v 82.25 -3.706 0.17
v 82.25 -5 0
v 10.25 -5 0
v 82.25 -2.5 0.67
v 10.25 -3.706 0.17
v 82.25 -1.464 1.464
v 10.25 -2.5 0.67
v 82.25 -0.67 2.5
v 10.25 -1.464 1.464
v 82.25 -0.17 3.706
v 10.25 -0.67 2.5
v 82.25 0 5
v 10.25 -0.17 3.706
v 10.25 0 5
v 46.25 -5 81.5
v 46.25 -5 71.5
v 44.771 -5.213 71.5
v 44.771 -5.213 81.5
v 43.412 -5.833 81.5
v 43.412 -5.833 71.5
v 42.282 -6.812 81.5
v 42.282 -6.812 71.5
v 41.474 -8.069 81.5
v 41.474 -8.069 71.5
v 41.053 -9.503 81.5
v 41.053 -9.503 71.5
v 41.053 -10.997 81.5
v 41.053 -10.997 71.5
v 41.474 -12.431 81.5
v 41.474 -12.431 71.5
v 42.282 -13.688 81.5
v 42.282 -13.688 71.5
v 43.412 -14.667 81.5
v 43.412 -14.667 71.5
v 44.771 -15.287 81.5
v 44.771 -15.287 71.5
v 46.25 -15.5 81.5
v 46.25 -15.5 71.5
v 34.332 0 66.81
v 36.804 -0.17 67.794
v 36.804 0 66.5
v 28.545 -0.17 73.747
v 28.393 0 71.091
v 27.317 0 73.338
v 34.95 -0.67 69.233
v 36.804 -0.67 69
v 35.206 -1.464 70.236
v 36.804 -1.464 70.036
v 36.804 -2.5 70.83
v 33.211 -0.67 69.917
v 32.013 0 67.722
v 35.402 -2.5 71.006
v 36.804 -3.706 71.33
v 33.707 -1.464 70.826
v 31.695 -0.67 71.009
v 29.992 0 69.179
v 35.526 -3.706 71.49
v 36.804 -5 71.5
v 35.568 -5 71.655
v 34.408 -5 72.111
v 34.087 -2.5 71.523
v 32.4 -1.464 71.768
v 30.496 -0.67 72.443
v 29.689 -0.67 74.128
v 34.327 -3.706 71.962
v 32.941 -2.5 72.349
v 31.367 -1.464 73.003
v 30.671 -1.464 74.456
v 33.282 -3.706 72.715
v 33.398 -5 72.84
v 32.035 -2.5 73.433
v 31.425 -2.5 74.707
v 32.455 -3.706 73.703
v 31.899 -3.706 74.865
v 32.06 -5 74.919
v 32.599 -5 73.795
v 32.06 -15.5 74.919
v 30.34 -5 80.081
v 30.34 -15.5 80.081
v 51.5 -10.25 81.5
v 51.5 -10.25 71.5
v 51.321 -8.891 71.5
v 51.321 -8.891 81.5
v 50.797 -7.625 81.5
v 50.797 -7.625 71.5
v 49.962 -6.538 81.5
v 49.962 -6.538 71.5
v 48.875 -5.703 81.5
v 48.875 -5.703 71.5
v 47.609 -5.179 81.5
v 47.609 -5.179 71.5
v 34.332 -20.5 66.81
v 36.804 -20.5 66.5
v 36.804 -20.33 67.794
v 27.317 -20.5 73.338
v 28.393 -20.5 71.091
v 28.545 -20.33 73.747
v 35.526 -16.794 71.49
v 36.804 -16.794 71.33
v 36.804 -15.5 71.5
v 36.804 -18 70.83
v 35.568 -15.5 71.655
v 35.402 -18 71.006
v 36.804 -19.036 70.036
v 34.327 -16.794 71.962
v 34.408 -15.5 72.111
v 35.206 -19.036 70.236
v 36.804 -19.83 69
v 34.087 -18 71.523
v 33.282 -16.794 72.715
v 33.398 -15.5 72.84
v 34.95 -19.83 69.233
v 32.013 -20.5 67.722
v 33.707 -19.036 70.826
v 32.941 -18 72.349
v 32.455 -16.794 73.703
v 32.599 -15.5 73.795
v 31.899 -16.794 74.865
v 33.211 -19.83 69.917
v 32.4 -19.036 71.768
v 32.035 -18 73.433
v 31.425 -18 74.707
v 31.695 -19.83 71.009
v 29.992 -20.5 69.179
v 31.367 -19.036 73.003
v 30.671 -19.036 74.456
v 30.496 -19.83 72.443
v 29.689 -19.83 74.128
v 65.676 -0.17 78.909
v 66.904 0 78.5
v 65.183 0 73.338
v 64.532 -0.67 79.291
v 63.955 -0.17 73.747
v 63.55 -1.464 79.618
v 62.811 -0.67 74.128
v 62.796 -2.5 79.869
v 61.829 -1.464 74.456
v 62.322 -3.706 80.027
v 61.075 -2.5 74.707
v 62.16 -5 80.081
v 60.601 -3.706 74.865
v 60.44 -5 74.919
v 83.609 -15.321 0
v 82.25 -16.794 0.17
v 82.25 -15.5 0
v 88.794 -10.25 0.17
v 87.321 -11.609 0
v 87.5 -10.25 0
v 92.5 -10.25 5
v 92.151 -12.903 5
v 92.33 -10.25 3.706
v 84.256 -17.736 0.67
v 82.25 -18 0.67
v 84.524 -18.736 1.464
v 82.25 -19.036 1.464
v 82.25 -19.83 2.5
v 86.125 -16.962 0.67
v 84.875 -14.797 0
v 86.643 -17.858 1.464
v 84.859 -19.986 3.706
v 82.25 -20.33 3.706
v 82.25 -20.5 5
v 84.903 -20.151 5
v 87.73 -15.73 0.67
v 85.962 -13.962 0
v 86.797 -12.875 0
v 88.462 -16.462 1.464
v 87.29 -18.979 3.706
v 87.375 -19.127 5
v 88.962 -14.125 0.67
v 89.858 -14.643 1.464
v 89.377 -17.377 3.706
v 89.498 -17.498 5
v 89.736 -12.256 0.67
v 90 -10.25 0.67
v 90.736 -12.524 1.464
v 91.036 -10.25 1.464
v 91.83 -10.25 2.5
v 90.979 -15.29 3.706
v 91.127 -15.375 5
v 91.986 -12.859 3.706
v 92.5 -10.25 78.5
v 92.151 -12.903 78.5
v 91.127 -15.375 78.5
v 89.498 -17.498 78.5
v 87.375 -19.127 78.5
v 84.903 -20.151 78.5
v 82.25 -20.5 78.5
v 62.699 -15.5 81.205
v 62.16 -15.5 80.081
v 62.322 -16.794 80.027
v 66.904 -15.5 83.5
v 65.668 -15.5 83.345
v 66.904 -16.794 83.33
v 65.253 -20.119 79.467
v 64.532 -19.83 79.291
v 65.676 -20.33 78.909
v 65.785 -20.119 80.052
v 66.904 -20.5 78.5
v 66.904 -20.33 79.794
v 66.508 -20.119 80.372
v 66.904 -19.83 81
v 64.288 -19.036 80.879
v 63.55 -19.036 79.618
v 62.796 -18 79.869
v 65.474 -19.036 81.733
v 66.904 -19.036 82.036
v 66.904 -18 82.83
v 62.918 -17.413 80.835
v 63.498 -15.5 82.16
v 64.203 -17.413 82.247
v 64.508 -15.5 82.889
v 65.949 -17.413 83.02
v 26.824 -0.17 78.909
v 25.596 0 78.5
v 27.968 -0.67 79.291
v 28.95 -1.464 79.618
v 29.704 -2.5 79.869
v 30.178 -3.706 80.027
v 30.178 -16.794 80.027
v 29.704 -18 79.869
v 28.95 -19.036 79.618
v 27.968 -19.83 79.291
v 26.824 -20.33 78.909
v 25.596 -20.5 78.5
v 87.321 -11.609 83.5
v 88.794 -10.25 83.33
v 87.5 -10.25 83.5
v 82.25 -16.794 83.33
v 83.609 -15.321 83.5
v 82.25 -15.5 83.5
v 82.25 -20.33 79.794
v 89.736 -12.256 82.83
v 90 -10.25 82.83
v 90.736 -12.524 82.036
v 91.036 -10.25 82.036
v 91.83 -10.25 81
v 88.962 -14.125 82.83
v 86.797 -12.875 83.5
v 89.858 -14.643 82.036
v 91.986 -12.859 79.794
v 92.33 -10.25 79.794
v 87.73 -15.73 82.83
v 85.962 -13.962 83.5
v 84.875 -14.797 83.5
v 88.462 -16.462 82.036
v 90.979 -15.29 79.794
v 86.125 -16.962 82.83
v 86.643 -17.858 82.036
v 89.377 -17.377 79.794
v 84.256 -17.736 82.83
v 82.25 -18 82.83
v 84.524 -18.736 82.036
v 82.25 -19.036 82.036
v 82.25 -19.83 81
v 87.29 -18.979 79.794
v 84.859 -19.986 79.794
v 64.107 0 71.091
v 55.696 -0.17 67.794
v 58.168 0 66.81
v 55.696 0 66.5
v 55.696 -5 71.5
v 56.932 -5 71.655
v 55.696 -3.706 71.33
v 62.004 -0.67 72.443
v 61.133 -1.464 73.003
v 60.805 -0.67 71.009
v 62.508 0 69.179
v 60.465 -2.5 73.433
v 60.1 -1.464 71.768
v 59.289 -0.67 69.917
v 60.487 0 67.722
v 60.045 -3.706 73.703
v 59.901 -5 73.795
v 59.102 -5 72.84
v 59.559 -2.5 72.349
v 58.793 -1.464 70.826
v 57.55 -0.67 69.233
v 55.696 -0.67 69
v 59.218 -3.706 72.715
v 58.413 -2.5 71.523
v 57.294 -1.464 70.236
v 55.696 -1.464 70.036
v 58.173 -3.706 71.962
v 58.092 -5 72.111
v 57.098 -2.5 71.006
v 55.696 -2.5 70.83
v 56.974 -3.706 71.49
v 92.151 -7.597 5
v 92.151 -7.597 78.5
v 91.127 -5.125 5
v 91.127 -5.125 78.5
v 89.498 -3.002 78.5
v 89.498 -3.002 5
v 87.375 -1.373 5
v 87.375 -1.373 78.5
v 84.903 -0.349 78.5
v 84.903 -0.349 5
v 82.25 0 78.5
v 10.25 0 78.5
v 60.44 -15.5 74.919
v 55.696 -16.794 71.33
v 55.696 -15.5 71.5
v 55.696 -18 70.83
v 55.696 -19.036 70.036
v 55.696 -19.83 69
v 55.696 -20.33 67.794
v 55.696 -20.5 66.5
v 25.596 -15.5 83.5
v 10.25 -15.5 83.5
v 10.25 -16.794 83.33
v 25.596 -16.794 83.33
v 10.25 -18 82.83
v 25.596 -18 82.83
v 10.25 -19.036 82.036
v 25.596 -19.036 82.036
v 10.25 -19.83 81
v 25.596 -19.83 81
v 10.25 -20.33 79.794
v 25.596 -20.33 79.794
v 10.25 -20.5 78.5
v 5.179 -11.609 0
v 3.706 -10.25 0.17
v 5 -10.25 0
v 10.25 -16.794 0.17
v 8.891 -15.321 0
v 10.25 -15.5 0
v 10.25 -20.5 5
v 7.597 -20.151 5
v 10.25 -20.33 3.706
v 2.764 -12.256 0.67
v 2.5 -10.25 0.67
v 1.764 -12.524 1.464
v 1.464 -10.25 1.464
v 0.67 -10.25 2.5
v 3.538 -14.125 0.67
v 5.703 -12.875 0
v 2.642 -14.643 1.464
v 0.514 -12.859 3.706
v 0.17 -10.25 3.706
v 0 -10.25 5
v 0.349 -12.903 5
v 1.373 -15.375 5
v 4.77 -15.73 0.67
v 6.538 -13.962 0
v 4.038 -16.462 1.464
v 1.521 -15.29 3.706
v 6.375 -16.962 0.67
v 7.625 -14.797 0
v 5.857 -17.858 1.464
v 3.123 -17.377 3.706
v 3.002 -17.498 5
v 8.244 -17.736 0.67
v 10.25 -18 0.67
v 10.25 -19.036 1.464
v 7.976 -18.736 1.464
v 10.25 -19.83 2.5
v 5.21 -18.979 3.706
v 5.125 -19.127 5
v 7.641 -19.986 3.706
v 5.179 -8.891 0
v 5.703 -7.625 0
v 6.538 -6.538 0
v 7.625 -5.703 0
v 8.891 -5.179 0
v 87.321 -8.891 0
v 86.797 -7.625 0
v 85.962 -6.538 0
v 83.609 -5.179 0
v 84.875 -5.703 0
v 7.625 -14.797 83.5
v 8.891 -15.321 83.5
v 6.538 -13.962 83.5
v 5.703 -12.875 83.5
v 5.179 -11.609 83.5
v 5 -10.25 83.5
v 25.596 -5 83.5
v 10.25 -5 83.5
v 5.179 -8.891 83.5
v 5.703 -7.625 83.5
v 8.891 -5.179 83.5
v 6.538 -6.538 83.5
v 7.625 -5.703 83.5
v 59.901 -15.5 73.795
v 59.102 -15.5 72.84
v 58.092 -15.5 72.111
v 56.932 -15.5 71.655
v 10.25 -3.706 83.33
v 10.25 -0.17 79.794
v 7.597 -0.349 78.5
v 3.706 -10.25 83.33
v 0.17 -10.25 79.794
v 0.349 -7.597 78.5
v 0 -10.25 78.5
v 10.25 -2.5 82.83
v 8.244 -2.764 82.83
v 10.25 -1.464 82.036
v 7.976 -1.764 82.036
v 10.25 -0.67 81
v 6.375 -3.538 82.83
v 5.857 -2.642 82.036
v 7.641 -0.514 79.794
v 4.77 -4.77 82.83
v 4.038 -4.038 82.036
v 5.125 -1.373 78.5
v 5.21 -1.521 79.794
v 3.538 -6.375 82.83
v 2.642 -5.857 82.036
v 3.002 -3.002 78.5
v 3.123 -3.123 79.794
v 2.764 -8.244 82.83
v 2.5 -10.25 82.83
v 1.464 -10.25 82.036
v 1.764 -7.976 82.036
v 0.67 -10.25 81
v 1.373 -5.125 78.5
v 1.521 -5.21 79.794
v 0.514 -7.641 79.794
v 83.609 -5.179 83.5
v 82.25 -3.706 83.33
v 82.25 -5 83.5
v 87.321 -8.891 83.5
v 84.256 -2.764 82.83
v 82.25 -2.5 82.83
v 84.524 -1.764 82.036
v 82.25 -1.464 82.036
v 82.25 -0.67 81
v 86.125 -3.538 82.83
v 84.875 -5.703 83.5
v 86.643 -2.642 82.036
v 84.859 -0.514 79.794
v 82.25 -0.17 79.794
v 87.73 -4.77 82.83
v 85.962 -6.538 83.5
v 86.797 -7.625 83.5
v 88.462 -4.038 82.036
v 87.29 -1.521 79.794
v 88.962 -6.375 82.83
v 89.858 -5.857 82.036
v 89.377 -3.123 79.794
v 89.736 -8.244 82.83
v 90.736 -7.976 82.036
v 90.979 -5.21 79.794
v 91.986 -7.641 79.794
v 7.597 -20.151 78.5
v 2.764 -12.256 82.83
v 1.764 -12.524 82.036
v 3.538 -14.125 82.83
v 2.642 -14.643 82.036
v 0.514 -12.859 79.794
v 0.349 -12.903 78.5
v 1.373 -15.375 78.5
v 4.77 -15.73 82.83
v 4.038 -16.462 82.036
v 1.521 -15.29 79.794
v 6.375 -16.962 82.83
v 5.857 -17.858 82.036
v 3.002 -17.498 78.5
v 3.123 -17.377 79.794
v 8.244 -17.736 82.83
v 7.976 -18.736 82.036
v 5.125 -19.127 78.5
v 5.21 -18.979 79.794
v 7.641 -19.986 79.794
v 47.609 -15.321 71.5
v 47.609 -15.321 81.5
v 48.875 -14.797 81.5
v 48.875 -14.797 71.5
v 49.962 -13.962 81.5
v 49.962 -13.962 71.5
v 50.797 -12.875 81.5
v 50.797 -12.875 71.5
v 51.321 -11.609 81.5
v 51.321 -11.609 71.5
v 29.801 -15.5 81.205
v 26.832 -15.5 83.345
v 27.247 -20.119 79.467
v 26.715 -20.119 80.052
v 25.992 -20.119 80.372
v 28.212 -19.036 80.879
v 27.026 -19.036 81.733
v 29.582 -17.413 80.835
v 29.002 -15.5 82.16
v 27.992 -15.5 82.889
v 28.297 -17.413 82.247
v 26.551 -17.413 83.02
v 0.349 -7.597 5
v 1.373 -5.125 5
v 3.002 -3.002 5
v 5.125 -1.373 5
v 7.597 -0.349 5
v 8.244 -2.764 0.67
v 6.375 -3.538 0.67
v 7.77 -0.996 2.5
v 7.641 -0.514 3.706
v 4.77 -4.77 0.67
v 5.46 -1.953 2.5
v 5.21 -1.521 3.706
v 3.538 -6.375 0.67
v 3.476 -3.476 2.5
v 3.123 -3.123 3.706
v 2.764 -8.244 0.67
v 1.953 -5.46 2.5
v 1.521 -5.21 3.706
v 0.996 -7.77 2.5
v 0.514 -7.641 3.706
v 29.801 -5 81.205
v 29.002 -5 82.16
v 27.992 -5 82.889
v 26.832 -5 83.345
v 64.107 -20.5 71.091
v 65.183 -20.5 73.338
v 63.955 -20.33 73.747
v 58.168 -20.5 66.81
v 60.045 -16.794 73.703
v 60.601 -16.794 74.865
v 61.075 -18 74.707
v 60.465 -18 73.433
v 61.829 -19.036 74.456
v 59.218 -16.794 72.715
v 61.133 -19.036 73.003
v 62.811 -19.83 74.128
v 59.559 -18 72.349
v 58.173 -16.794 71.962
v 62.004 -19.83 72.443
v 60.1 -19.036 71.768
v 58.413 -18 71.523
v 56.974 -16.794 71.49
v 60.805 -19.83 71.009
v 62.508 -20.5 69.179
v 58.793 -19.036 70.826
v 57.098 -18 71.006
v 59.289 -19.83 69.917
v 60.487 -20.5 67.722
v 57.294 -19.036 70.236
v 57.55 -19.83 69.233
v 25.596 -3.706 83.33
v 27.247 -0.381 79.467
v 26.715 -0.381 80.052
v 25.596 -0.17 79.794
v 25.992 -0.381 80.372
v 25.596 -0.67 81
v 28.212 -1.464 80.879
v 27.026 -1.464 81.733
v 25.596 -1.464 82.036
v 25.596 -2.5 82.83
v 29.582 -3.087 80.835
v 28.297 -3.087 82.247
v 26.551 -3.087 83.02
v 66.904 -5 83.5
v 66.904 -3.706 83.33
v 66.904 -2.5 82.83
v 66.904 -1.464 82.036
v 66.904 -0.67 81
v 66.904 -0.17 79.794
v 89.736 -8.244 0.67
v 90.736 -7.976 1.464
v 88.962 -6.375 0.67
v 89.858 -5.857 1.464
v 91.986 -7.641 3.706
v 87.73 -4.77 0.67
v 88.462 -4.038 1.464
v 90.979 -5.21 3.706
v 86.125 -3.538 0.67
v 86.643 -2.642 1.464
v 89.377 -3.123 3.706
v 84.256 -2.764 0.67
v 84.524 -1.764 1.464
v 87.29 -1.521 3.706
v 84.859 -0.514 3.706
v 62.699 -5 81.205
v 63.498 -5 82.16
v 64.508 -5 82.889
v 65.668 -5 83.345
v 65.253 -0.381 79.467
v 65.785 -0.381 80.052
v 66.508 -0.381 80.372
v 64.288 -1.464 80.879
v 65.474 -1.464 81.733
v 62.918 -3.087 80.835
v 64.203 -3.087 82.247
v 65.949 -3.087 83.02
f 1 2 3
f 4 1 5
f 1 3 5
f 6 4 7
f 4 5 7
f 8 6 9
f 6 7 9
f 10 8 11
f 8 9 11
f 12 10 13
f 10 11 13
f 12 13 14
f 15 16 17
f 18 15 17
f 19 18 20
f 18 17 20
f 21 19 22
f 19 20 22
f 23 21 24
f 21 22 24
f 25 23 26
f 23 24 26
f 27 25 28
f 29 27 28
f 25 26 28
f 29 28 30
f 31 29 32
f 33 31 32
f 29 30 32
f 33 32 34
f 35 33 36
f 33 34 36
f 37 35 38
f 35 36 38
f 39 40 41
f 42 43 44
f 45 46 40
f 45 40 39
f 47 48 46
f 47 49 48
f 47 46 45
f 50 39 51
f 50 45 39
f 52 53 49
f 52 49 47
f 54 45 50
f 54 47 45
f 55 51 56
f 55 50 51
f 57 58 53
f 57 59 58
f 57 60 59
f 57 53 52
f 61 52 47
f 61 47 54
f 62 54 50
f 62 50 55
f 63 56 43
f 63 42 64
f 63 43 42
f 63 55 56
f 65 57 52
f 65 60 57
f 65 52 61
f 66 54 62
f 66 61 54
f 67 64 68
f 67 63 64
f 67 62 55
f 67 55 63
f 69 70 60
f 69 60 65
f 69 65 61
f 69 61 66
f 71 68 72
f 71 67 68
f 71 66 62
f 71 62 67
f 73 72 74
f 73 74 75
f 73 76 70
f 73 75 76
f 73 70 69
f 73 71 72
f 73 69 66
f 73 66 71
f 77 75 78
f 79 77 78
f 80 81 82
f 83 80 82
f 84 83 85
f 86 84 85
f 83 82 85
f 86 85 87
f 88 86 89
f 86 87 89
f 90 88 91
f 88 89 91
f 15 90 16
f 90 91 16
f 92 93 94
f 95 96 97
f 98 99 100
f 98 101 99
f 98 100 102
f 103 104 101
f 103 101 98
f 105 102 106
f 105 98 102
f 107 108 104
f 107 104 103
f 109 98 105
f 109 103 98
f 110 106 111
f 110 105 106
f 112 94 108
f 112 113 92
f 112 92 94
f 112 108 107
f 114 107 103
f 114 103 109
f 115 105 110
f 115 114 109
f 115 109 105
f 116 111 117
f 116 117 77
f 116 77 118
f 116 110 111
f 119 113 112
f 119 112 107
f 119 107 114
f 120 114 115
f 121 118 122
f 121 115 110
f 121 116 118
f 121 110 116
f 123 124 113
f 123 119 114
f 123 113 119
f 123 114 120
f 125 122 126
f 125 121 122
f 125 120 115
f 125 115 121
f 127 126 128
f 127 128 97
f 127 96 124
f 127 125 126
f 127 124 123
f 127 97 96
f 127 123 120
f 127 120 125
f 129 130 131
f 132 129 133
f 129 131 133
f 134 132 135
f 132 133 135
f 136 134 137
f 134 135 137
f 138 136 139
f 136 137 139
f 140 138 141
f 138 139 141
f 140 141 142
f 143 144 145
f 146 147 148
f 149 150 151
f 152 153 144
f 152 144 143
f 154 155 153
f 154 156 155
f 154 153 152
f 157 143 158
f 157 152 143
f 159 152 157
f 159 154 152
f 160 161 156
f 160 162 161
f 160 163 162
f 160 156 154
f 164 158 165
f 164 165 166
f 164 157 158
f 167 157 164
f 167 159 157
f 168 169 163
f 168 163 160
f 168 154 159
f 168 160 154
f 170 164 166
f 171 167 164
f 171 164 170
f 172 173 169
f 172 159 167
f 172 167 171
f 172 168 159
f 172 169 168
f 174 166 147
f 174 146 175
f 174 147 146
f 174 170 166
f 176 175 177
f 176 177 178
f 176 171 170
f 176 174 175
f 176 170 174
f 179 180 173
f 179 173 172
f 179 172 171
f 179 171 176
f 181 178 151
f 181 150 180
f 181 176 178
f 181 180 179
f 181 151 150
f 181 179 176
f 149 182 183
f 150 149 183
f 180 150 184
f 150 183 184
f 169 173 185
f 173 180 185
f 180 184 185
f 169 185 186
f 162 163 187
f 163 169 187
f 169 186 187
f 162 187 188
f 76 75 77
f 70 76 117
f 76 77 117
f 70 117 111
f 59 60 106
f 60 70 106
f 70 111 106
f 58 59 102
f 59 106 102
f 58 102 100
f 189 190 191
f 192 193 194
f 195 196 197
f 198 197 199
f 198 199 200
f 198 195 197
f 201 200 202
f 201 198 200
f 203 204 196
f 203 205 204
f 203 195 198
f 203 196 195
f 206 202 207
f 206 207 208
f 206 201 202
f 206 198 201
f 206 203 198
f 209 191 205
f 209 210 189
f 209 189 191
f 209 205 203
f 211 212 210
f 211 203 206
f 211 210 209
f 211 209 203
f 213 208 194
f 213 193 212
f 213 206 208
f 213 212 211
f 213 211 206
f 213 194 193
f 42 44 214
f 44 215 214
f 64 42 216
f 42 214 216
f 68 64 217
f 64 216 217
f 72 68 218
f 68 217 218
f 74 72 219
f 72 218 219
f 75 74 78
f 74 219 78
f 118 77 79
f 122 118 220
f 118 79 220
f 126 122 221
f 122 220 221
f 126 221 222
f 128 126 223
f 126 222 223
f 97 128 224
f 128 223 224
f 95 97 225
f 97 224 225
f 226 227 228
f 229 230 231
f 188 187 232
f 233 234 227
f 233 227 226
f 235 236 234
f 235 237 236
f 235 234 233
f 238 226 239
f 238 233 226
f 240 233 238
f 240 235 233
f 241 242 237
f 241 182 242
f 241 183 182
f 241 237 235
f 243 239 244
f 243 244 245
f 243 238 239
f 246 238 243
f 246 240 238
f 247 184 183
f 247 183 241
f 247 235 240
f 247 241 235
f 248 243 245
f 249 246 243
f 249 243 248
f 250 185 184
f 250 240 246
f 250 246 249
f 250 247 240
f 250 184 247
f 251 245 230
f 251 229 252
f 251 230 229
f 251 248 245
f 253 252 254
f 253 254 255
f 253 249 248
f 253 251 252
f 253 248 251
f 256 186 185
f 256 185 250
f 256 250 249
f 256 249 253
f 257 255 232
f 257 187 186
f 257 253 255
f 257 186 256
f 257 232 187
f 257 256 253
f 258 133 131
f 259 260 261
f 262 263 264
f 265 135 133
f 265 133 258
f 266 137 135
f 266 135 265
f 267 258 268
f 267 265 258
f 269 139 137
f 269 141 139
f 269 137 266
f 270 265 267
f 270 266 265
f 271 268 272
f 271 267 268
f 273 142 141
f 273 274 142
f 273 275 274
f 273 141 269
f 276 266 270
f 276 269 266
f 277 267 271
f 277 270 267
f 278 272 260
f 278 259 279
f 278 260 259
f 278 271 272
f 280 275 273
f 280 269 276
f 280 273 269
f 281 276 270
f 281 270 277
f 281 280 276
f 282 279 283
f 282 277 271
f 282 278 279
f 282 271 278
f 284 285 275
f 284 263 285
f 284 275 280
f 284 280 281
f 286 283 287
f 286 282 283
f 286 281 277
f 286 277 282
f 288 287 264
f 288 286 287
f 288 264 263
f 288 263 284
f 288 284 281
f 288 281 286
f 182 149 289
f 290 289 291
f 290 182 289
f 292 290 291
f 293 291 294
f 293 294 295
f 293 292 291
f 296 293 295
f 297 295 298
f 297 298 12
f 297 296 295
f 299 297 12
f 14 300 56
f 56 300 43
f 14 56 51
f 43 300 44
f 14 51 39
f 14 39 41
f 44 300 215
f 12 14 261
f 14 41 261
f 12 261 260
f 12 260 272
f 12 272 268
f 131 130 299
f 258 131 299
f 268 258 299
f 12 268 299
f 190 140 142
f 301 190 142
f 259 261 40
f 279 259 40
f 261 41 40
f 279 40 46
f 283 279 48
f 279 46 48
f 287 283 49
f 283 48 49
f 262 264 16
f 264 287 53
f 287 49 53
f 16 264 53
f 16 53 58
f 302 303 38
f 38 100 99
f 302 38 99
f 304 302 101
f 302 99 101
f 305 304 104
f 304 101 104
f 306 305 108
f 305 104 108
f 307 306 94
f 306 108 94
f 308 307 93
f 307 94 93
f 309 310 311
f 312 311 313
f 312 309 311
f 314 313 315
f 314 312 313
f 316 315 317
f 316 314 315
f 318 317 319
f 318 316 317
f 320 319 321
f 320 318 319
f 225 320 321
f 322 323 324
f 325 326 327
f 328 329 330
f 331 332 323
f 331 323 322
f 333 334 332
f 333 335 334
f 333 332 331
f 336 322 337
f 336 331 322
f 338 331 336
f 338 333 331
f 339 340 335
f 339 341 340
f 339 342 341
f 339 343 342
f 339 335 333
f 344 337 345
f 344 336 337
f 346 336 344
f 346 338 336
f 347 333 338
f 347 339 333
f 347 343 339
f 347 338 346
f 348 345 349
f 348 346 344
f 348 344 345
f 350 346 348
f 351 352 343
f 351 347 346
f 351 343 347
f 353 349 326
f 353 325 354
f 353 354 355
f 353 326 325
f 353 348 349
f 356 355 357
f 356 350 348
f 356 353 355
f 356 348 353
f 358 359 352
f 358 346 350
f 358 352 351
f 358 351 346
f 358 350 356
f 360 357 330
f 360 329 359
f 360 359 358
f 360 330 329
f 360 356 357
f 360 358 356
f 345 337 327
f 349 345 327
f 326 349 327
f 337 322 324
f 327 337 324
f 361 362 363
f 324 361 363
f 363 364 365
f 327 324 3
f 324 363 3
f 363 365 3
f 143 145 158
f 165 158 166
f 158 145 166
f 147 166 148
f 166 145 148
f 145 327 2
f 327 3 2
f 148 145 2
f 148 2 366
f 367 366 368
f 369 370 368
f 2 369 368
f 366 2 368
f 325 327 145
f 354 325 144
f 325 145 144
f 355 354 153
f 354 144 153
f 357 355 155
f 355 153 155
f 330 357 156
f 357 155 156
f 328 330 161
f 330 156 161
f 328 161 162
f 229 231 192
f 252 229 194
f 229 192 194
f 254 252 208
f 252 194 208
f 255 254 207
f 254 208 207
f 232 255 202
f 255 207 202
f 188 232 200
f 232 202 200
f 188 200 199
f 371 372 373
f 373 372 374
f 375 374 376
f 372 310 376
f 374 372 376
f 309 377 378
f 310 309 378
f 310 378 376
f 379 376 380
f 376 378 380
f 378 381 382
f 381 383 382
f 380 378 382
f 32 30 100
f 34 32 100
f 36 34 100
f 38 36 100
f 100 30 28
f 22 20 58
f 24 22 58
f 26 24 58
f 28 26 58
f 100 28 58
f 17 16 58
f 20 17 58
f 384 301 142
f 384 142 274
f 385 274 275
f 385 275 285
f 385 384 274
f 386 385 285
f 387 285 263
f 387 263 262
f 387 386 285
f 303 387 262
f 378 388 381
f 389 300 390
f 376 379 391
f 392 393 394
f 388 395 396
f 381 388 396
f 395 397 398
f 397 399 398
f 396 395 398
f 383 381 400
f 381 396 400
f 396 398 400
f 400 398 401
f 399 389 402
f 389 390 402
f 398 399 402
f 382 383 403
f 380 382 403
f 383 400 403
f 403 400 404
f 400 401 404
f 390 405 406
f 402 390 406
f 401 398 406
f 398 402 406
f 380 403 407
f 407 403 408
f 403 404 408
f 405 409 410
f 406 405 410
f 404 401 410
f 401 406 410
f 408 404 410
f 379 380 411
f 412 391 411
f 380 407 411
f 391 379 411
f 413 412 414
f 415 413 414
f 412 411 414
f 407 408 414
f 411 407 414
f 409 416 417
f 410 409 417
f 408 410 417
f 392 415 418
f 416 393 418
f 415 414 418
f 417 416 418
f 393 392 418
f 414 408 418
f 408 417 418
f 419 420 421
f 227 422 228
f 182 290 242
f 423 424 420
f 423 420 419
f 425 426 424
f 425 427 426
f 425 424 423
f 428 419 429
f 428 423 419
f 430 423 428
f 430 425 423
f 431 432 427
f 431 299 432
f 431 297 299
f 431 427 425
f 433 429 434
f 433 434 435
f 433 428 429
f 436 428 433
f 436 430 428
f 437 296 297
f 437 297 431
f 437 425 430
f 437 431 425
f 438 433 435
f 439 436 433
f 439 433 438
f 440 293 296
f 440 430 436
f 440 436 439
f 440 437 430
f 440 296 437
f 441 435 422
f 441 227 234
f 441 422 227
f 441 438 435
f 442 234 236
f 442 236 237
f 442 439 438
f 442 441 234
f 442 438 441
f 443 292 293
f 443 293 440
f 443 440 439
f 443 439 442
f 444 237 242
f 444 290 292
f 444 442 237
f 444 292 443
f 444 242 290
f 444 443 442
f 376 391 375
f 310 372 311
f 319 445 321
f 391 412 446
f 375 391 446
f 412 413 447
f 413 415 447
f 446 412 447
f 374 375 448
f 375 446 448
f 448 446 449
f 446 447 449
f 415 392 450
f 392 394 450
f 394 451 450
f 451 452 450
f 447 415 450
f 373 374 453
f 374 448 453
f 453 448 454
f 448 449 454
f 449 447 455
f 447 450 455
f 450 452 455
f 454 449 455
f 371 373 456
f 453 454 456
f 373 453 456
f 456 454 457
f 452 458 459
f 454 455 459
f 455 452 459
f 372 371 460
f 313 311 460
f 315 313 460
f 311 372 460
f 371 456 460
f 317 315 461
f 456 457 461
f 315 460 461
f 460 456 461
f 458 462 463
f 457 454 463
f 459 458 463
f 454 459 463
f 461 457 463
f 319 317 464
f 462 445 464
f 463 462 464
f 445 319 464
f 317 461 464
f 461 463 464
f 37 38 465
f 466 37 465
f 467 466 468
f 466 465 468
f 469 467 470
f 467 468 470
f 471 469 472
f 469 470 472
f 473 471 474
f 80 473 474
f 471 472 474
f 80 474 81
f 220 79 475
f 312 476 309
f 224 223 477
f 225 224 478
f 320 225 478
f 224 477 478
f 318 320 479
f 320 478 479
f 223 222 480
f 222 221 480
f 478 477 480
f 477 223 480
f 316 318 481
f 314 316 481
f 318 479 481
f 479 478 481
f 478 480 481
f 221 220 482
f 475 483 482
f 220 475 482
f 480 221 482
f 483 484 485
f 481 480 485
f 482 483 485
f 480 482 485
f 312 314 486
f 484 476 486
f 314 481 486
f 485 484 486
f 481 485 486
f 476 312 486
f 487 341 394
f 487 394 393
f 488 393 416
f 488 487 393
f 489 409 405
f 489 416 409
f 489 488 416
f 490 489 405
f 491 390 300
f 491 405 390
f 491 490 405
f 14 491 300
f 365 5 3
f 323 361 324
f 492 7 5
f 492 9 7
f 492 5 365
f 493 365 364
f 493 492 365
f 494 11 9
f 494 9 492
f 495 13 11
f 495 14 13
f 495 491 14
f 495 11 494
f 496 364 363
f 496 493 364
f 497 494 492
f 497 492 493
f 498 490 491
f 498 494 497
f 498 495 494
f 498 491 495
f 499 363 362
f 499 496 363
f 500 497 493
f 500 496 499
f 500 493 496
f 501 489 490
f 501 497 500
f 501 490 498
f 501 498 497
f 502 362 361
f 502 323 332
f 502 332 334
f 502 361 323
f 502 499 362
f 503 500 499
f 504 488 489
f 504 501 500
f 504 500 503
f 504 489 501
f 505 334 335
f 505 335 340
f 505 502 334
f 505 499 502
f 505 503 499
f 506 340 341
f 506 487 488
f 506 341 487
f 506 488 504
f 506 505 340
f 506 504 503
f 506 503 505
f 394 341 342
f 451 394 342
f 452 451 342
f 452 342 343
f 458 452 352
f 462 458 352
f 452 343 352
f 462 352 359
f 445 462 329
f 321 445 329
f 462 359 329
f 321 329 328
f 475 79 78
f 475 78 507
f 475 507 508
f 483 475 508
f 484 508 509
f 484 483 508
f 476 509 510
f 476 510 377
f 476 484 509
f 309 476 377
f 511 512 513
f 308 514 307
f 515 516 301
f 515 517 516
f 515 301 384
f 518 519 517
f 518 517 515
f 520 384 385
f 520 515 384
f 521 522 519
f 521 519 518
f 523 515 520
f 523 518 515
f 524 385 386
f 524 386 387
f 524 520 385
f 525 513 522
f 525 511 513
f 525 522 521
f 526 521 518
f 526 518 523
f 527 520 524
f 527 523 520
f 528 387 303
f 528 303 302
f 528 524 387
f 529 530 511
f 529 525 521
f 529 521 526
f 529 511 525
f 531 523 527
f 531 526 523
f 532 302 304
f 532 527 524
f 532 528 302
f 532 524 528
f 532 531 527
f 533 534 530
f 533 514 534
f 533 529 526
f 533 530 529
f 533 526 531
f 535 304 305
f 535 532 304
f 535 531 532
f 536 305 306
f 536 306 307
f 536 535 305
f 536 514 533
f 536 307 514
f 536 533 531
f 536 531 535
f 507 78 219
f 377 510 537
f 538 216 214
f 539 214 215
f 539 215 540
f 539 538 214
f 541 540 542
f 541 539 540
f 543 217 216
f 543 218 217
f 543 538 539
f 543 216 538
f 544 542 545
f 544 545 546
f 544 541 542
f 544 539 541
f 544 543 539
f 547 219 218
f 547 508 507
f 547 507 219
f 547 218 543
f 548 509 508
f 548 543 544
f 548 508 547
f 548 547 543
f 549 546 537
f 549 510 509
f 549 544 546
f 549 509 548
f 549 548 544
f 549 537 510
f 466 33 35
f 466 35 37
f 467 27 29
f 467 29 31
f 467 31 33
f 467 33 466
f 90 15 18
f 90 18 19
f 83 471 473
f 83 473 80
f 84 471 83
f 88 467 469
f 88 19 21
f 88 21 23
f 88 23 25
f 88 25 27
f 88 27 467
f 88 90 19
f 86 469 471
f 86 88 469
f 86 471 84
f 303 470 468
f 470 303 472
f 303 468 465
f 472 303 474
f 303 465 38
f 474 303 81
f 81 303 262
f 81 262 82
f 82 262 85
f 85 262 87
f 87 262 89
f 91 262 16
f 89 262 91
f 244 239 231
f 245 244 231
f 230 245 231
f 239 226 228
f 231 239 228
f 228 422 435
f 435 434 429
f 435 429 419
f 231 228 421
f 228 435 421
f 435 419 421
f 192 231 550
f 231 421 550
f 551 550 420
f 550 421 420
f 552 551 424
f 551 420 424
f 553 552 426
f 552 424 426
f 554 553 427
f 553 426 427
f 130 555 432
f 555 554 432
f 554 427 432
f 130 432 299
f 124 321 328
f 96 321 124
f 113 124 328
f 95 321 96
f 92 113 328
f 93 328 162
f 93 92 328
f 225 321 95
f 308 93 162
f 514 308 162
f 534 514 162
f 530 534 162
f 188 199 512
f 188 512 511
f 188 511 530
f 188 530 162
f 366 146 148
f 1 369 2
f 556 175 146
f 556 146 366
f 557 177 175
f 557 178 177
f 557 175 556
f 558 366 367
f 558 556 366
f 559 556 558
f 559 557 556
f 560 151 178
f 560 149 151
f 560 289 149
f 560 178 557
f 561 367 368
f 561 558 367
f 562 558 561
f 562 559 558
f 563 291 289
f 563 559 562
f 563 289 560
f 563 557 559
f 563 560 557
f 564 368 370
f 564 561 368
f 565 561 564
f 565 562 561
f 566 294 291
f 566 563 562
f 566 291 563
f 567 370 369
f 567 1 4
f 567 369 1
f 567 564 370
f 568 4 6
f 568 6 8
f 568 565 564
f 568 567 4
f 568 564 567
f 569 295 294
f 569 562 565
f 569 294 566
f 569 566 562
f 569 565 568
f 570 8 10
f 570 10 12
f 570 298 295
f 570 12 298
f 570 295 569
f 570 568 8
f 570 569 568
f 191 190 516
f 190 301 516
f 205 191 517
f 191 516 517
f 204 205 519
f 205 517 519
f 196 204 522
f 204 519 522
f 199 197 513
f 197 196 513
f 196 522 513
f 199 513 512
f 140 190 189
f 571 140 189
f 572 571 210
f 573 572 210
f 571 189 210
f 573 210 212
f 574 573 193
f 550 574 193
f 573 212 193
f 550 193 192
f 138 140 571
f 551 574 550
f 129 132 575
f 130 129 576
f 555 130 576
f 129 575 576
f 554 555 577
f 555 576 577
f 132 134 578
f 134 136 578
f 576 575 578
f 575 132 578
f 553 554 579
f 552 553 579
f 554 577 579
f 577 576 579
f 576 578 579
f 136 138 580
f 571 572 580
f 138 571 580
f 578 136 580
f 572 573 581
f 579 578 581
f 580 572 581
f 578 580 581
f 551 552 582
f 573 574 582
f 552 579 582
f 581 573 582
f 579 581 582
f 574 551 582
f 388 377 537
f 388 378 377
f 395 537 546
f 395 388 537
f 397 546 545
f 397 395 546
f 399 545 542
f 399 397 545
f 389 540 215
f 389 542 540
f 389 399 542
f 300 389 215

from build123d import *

# Parameters (mm, degrees)
F1_DEPTH = 20.5
F2_R     = 10.24999
F3_F1_R  = 5
F3_F2_R  = 5
F5_DEPTH = 10


# Not quite as in the source:
# - a fillet or chamfer is up to 0.001 mm smaller than in the source, because OpenCascade refuses the exact size


with BuildPart() as f1:
    # F0 (on Front) → F1 (new body)
    with BuildSketch(Plane.XZ):
        Polygon((0, 83.5), (0, 0), (46.25, 0), (46.25, 71.5), (33.2, 71.5), (29.2, 83.5), align=None)
        Polygon((46.25, 71.5), (46.25, 0), (92.5, 0), (92.5, 83.5), (63.3, 83.5), (59.3, 71.5), align=None)
    extrude(amount=F1_DEPTH)

    # F2 (radius 10.25 in the source; OpenCascade refuses exactly that, so slightly less here)
    f2_edges = [f1.edges().sort_by_distance(p)[0] for p in [
        (0, -20.5, 41.75),
        (0, 0, 41.75),
        (92.5, -20.5, 41.75),
        (92.5, 0, 41.75),
    ]]
    fillet(f2_edges, radius=F2_R)

    # F3: fillet of radius 5 on 24 edges, made by hand

    # F3_f1
    f3_f1_edges = [f1.edges().sort_by_distance(p)[0] for p in [
        (59.3, -10.25, 71.5),
        (33.2, -10.25, 71.5),
    ]]
    fillet(f3_f1_edges, radius=F3_F1_R)

    # F3_f2
    f3_f2_edges = [f1.edges().sort_by_distance(p)[0] for p in [
        (92.5, -10.25, 83.5),
        (89.4978474361, -3.0021525639, 83.5),
        (89.4978474361, -17.4978474361, 83.5),
        (72.775005, 0, 83.5),
        (72.775005, -20.5, 83.5),
        (63.3, -10.25, 83.5),
        (0, -10.25, 83.5),
        (3.0021525639, -3.0021525639, 83.5),
        (3.0021525639, -17.4978474361, 83.5),
        (19.724995, 0, 83.5),
        (19.724995, -20.5, 83.5),
        (29.2, -10.25, 83.5),
        (0, -10.25, 0),
        (3.0021525639, -3.0021525639, 0),
        (3.0021525639, -17.4978474361, 0),
        (46.25, 0, 0),
        (46.25, -20.5, 0),
        (89.4978474361, -3.0021525639, 0),
        (89.4978474361, -17.4978474361, 0),
        (92.5, -10.25, 0),
        (46.25, 0, 71.5),
        (46.25, -20.5, 71.5),
        (58.619755323, -20.5, 72.4437890741),
        (33.880244677, -20.5, 72.4437890741),
        (58.619755323, 0, 72.4437890741),
        (33.880244677, 0, 72.4437890741),
    ]]
    fillet(f3_f2_edges, radius=F3_F2_R)

    # F4 (on face) → F5 (join)
    with BuildSketch(Plane.XY.offset(71.5)):
        with BuildLine():
            ThreePointArc((46.25, -15.5), (49.9623106012, -13.9623106012), (51.5, -10.25))
            ThreePointArc((51.5, -10.25), (49.9623106012, -6.5376893988), (46.25, -5))
            ThreePointArc((46.25, -5), (41, -10.25), (46.25, -15.5))
        make_face()
    extrude(amount=F5_DEPTH)


solid = f1.part
